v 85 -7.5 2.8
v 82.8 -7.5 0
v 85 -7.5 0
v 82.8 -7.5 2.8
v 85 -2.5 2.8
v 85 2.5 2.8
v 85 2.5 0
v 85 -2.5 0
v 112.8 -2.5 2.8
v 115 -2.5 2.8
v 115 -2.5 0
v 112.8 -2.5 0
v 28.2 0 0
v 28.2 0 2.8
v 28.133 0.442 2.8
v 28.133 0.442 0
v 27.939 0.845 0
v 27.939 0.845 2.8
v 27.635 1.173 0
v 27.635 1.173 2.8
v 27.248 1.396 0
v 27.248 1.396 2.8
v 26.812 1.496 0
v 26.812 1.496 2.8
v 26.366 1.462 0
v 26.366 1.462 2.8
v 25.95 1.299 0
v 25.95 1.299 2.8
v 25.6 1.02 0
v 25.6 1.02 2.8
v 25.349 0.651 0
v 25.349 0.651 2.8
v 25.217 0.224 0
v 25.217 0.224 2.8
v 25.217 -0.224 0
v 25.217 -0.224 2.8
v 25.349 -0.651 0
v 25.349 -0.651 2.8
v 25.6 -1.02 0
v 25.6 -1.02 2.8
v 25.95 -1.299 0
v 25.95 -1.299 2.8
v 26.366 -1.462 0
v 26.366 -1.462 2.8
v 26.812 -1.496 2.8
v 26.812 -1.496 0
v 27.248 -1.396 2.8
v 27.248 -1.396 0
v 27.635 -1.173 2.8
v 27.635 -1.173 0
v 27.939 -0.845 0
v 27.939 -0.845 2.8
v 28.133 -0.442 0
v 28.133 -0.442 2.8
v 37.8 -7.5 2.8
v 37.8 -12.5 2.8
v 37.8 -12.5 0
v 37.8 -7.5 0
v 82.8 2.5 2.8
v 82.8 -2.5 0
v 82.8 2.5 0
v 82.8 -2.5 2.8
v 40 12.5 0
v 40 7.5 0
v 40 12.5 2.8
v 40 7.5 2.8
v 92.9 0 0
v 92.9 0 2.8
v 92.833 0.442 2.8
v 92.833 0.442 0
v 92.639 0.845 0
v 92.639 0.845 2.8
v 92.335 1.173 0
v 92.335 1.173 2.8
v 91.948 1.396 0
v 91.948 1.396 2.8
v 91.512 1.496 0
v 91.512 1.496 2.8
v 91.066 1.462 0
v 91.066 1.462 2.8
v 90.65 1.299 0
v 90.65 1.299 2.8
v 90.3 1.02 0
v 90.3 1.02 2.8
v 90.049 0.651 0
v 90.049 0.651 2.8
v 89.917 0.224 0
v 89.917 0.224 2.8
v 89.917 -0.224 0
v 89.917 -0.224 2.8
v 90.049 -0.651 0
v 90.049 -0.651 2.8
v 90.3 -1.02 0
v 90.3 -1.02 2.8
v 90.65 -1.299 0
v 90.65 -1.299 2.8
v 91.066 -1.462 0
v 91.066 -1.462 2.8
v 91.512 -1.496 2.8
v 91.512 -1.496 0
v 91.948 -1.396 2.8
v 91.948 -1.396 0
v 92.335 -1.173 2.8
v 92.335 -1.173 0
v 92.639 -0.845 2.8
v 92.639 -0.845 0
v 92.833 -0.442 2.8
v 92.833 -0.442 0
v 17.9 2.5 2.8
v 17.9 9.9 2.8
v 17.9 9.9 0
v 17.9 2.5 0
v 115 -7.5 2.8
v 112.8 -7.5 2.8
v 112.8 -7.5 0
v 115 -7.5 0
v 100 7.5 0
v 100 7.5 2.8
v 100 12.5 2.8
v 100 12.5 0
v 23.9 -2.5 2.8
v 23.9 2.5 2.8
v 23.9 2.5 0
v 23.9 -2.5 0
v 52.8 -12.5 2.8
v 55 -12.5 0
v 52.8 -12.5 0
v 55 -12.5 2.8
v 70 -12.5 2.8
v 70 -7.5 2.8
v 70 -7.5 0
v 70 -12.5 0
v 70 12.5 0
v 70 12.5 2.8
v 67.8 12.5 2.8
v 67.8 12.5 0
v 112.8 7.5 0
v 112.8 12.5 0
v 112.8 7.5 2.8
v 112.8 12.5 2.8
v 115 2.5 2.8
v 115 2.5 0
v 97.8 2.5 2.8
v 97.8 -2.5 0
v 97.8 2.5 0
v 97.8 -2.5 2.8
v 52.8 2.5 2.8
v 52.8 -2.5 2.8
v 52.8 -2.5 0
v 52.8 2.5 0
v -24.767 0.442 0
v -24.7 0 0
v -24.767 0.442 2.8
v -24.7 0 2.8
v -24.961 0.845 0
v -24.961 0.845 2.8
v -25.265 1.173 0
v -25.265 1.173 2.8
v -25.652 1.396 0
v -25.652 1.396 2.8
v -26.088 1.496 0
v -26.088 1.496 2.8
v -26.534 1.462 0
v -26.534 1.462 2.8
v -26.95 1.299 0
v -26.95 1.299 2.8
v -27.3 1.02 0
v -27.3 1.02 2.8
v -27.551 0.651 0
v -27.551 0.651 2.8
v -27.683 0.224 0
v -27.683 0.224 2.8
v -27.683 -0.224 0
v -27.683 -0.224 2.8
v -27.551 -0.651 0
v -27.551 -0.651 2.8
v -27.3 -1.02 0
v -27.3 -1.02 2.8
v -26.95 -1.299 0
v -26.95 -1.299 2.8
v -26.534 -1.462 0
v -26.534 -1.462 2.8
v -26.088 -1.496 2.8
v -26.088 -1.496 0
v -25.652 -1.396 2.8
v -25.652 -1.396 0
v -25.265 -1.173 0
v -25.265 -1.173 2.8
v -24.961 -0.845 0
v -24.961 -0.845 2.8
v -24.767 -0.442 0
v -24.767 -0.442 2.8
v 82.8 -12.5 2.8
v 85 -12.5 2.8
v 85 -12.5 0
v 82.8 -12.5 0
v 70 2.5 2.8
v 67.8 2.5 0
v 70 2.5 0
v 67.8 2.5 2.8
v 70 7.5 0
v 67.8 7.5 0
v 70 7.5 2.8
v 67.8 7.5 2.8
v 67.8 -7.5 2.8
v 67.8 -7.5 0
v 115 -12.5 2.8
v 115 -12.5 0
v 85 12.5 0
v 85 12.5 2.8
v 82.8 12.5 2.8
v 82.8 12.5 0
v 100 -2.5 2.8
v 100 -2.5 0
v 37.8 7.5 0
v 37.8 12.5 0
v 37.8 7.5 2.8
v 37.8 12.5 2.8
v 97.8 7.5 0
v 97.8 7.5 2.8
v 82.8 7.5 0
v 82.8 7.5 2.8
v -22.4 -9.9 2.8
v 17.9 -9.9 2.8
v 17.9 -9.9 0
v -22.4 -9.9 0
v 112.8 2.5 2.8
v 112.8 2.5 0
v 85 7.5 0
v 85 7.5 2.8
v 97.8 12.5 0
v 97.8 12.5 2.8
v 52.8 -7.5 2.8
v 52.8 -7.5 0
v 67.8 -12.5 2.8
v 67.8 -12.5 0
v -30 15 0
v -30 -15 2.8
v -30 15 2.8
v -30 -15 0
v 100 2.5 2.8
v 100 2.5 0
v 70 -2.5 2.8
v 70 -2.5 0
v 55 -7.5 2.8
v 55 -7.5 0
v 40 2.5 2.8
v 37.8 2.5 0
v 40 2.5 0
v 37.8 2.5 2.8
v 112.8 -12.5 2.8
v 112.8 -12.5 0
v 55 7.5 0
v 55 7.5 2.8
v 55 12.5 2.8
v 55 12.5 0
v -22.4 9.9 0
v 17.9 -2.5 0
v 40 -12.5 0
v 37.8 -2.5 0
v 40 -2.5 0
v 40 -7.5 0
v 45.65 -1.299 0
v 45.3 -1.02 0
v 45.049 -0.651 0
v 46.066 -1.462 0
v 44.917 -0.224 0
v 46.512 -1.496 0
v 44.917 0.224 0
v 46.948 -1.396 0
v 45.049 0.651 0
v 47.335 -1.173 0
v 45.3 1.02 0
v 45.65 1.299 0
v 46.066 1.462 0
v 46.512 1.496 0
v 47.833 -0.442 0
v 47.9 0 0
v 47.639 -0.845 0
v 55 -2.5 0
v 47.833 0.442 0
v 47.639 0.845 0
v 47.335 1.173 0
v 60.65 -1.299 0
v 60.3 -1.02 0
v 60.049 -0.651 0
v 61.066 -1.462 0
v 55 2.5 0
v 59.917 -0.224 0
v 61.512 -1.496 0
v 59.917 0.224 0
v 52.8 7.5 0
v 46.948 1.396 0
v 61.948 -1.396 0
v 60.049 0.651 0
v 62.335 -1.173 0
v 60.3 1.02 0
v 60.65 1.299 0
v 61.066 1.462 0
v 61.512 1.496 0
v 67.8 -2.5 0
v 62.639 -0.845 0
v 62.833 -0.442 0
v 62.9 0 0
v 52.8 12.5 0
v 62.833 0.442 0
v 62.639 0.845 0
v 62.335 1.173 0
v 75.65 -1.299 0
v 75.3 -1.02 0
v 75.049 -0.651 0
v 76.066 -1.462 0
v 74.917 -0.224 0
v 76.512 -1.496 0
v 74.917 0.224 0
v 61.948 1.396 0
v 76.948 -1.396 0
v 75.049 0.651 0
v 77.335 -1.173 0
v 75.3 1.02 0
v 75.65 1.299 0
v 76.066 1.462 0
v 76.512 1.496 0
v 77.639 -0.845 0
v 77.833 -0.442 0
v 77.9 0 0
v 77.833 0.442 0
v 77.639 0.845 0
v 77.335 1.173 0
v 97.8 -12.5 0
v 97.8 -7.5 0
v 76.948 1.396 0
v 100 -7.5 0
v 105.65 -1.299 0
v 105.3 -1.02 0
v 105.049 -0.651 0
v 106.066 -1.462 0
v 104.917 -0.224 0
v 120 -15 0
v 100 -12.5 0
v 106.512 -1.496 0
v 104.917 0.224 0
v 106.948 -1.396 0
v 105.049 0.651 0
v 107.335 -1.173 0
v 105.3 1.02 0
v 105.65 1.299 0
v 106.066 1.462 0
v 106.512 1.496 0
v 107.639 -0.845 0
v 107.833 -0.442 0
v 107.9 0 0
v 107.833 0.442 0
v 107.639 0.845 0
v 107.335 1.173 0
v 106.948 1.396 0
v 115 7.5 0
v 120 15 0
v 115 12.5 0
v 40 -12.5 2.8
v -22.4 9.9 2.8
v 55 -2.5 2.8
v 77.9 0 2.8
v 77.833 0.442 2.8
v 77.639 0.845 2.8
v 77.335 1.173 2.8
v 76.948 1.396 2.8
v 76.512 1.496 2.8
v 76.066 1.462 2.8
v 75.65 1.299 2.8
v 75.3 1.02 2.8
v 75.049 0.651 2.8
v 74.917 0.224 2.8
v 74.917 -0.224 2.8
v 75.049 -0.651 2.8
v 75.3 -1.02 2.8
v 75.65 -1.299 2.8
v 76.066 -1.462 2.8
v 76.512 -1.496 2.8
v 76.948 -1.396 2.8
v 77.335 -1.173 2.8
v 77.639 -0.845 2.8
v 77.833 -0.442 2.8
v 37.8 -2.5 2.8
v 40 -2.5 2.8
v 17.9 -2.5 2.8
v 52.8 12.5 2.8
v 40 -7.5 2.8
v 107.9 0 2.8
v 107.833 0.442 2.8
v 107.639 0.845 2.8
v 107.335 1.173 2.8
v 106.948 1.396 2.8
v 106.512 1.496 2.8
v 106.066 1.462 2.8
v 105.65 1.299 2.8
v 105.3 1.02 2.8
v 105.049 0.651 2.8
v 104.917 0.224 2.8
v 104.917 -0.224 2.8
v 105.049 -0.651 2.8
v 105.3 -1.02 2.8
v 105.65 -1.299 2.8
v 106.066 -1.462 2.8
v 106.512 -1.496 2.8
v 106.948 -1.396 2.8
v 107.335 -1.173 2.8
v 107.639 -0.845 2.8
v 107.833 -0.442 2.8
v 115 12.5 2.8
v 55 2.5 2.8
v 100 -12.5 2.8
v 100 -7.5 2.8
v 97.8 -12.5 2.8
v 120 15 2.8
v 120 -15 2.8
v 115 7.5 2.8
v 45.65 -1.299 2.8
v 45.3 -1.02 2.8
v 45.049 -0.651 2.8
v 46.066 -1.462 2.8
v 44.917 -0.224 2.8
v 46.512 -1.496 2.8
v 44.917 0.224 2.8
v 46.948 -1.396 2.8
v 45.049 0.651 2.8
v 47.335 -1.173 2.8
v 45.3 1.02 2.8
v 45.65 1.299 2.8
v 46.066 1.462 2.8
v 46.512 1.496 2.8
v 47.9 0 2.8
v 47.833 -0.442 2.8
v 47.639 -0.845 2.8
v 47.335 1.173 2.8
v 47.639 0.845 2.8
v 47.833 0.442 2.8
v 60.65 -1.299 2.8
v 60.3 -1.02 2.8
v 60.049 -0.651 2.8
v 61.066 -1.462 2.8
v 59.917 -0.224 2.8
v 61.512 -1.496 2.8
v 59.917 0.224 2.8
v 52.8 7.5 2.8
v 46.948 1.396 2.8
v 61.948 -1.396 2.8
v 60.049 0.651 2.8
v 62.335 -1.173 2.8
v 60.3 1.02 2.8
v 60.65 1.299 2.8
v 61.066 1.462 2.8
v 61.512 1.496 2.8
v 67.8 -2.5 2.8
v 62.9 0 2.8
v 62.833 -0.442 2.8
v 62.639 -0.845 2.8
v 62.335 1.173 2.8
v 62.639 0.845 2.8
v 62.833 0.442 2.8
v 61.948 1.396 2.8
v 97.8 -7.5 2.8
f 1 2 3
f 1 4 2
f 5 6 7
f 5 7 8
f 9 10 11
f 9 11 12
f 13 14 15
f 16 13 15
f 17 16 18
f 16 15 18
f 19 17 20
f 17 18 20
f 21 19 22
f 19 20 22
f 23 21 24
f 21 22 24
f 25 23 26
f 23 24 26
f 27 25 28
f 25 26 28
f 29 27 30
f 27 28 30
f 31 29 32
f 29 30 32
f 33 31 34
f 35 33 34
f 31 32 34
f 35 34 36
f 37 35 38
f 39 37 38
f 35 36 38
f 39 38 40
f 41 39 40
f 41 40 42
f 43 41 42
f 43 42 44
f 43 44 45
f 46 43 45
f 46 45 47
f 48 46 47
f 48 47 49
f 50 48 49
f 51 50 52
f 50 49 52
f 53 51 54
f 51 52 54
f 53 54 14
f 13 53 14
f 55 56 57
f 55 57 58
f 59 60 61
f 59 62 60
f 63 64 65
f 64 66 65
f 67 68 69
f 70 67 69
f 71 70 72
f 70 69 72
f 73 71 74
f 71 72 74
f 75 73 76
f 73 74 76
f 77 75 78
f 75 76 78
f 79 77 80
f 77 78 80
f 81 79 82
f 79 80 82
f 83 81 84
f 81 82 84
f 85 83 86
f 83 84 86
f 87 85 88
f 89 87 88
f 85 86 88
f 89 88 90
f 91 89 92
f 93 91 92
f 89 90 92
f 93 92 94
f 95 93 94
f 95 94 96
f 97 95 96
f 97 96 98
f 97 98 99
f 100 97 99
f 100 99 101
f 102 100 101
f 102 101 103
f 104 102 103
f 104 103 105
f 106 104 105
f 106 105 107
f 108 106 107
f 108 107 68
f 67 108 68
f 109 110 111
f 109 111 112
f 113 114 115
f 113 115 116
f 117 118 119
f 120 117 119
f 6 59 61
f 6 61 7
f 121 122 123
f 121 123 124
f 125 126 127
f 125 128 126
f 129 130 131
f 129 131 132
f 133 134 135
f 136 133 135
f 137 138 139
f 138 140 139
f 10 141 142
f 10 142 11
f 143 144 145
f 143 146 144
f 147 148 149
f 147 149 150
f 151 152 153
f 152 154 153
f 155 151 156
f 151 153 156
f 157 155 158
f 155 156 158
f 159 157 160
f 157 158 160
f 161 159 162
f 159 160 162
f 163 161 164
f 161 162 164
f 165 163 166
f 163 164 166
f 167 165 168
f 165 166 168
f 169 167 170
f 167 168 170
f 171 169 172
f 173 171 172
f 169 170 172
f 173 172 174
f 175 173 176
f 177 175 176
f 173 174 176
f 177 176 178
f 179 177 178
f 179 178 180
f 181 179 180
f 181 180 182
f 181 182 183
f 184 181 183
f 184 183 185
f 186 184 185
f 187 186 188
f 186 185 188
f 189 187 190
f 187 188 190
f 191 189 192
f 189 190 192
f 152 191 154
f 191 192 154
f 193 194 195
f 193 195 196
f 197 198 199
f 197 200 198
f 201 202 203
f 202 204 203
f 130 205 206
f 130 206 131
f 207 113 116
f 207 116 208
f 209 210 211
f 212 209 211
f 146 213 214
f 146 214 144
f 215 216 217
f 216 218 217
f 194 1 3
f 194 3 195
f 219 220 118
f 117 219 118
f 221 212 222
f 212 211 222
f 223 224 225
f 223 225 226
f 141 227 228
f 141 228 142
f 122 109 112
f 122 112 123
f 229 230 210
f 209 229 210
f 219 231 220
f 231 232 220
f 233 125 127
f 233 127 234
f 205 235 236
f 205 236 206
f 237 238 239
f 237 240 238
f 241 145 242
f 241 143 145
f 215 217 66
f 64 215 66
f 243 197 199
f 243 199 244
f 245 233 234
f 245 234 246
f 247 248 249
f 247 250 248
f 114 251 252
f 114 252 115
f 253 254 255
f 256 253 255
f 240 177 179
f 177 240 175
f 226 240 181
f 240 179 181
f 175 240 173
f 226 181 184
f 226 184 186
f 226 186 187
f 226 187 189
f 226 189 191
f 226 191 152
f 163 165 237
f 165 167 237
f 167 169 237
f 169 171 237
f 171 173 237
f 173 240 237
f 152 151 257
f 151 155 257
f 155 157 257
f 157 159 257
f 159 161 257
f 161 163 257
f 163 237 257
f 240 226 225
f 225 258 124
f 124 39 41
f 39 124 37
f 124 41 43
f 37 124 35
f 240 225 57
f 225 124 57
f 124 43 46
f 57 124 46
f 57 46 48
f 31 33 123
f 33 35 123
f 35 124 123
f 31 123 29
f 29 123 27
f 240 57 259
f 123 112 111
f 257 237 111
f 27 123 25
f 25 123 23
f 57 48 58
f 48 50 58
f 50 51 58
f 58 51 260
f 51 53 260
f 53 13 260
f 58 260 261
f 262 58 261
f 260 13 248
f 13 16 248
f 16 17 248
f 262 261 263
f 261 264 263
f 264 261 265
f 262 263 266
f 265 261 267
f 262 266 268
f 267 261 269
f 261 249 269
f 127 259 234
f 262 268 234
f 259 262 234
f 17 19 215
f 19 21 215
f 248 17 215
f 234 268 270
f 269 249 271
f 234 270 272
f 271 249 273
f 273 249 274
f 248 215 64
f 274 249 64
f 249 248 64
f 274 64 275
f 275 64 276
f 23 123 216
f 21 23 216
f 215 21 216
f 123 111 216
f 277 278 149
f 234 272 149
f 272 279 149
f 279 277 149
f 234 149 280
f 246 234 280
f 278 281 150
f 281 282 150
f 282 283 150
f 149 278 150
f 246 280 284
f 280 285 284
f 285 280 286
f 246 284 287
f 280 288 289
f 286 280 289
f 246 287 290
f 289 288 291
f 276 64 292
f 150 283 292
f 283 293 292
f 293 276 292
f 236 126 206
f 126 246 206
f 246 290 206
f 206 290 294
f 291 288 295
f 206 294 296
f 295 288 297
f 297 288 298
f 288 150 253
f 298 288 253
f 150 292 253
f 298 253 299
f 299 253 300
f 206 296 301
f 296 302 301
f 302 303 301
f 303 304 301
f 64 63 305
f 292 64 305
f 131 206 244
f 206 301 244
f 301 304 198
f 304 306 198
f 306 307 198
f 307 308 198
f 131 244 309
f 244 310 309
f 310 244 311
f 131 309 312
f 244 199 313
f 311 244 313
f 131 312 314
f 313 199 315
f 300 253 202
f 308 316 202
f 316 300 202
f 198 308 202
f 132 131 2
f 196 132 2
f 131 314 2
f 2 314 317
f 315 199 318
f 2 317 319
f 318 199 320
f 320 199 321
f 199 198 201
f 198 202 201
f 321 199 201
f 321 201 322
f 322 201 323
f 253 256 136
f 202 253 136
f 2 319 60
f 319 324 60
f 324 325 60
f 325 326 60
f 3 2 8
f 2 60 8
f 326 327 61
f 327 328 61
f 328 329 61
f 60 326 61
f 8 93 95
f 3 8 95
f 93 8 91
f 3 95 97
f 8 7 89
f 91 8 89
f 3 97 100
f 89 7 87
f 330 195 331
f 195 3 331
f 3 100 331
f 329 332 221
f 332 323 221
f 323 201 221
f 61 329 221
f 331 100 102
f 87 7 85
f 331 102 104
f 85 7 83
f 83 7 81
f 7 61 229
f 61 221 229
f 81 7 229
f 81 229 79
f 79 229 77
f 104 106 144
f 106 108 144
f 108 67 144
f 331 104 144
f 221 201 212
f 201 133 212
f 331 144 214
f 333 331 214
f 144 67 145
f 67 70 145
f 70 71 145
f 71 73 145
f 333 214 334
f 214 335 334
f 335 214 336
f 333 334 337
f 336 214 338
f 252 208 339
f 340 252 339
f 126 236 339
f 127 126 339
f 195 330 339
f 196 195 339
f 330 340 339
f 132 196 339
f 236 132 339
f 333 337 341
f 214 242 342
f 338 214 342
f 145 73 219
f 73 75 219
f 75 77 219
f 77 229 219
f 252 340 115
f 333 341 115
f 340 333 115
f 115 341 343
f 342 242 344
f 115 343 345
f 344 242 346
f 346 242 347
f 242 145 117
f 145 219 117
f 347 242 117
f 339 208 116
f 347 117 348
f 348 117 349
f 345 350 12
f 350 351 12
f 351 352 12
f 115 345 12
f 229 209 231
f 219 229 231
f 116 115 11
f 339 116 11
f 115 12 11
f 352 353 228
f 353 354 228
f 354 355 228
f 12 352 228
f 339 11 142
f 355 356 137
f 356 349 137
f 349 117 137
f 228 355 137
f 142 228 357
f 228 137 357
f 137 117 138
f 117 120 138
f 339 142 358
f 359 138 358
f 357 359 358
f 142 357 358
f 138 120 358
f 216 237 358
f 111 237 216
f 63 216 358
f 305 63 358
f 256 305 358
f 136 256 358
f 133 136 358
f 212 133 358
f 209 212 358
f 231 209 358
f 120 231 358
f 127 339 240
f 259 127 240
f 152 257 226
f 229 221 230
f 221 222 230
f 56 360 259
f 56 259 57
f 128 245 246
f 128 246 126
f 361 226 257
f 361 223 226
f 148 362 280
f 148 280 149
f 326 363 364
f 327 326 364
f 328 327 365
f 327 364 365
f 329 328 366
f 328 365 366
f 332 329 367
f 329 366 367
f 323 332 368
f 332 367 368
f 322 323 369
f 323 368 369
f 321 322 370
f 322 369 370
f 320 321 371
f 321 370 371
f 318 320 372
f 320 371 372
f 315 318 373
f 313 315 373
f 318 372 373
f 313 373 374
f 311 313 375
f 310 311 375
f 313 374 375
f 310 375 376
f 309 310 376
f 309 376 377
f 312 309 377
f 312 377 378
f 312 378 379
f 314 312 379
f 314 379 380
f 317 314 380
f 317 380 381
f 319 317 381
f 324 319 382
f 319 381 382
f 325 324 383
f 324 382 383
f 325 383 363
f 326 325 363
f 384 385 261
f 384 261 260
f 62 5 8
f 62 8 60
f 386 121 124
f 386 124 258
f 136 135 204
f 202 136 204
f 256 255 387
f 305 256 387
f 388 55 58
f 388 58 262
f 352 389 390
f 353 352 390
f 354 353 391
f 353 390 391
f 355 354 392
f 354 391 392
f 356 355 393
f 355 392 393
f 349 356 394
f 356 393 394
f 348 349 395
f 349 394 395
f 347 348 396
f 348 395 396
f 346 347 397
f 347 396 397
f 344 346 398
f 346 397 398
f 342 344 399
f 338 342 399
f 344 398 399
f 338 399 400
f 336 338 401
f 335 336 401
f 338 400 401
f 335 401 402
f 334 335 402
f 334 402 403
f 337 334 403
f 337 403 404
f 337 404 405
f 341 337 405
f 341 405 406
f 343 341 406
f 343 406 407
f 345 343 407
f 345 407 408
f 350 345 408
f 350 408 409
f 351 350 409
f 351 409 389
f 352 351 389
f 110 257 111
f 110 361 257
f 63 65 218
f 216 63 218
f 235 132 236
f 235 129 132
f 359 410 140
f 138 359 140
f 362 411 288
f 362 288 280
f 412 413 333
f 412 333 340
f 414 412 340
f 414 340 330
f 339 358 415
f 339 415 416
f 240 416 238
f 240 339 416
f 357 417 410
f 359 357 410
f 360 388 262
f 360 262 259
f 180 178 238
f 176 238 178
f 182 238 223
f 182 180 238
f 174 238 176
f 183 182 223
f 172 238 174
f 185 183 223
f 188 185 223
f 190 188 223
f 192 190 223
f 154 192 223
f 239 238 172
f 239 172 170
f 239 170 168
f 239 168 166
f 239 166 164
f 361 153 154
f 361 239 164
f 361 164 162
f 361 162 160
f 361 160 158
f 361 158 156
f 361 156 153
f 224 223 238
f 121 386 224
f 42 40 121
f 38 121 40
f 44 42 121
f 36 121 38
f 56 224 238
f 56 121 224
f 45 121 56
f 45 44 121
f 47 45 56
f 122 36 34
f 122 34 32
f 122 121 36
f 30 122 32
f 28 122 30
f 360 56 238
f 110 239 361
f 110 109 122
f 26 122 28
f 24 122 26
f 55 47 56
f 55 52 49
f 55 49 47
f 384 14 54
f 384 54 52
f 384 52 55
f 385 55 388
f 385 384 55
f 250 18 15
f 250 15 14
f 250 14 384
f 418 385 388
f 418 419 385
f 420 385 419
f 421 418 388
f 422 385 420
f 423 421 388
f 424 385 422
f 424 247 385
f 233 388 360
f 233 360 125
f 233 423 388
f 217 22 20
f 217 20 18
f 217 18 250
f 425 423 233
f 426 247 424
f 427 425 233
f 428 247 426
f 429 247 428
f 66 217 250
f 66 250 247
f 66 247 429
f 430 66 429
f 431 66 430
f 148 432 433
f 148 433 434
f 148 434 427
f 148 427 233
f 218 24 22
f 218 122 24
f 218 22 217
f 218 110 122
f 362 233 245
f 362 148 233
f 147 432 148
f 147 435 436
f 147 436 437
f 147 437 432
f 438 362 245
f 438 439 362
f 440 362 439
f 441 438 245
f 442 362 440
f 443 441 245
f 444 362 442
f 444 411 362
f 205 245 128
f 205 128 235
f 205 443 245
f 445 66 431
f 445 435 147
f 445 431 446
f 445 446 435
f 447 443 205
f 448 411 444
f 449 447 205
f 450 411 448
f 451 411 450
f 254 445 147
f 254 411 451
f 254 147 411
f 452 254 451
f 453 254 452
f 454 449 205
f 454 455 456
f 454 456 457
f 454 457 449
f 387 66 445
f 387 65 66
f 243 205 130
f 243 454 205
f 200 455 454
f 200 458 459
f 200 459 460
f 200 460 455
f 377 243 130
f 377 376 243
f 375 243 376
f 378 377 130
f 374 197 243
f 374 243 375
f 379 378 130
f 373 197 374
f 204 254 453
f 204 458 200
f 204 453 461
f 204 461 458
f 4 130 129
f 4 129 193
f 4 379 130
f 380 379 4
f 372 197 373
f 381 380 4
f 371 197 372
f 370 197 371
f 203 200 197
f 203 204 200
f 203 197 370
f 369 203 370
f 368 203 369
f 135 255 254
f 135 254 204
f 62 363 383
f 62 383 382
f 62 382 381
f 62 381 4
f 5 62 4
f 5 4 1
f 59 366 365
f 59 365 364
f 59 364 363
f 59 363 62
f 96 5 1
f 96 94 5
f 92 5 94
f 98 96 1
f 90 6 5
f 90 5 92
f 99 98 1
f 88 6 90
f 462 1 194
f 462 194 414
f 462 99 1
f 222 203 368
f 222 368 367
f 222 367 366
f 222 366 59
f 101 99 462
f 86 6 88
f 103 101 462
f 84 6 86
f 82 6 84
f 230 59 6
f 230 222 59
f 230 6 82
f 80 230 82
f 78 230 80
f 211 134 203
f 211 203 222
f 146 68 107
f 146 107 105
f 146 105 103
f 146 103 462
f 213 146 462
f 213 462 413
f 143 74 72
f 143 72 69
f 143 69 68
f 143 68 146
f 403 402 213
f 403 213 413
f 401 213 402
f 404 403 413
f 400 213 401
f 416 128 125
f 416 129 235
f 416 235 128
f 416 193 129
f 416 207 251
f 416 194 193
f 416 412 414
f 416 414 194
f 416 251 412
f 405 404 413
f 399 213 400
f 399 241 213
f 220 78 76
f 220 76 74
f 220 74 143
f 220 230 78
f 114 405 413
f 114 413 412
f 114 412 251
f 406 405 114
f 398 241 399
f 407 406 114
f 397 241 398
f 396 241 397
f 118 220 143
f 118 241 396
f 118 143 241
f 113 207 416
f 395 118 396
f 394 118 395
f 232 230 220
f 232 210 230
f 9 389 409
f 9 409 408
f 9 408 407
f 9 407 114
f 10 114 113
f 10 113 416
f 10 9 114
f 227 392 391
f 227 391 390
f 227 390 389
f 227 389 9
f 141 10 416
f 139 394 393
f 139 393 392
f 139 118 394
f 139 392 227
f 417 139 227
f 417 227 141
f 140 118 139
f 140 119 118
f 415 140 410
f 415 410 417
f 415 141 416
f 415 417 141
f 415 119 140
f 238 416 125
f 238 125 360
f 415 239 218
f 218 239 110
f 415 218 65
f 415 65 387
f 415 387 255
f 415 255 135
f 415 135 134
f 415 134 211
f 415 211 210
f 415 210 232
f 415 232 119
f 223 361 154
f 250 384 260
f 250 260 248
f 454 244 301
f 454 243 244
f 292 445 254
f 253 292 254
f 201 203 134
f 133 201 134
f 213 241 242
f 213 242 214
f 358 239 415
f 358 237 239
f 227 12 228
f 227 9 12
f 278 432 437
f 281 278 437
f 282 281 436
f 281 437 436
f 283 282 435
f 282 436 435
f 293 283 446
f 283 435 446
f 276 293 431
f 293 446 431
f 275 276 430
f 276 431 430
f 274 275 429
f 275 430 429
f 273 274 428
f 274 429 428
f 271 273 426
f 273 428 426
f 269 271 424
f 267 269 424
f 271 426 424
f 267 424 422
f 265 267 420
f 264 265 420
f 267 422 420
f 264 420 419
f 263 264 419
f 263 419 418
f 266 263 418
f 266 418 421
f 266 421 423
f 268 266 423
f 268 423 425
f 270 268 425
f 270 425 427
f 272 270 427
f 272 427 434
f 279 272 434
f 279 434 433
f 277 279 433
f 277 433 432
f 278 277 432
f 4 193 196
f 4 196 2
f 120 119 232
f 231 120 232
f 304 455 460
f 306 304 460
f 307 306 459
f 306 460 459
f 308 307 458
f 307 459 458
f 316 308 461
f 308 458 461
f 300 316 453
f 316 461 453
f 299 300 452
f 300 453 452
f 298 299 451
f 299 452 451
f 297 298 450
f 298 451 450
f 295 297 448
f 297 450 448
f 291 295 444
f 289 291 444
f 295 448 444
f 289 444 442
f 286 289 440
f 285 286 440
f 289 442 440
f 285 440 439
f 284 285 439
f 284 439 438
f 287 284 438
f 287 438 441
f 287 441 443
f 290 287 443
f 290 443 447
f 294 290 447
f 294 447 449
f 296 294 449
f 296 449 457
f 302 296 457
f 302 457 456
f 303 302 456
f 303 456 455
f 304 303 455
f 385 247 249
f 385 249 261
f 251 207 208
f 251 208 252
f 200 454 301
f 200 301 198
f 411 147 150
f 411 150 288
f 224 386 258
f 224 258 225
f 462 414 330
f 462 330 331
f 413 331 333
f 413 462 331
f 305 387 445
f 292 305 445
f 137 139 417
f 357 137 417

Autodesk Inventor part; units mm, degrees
ref_plane "YZ Plane" through (0, 0, 0) normal (1, 0, 0) x (0, 1, 0)
ref_plane "XZ Plane" through (0, 0, 0) normal (0, 1, 0) x (-1, 0, 0)
ref_plane "XY Plane" through (0, 0, 0) normal (0, 0, 1) x (1, 0, 0)
sketch "Sketch1" plane through (0, 0, 0) normal (0, 0, 1) x (1, 0, 0)
  line L0 (-30, -15) -> (-30, 15)
  line L1 (-30, 15) -> (120, 15)
  line L2 (120, 15) -> (120, -15)
  line L3 (120, -15) -> (-30, -15)
  line L4 (-60, 0) -> (150, 0) projected
  line L5 (0, -21) -> (0, 21) projected
  dimension "d13" = 30
  dimension "d55" = 150
  dimension "d56" = 15
extrude "Extrusion1" add sketch "Sketch1" along normal blind 2.8
sketch "Sketch4" plane through (0, 0, 2.8) normal (0, 0, 1) x (1, 0, 0)
  line L0 (-60, 0) -> (150, 0) projected
  line L1 (17.9, 9.9) -> (17.9, 2.5)
  line L2 (-22.4, 9.9) -> (17.9, 9.9)
  line L3 (17.9, 2.5) -> (23.9, 2.5)
  line L4 (23.9, 2.5) -> (23.9, -2.5)
  line L5 (23.9, -2.5) -> (17.9, -2.5)
  line L6 (17.9, -2.5) -> (17.9, -9.9)
  line L7 (17.9, -9.9) -> (-22.4, -9.9)
  line L8 (-22.4, -9.9) -> (-22.4, 9.9)
  line L9 (-22.4, 9.9) -> (17.9, 9.9)
  circle A0 centre (26.7, 0) radius 1.5
  circle A1 centre (-26.2, 0) radius 1.5
  line L10 (120, 15) -> (120, -15) projected
  line L11 (120, -15) -> (-30, -15) projected
  line L12 (112.8, 2.5) -> (115, 2.5)
  line L13 (115, 2.5) -> (115, -2.5)
  line L14 (115, -2.5) -> (112.8, -2.5)
  line L15 (112.8, -2.5) -> (112.8, 2.5)
  line L16 (97.8, 2.5) -> (100, 2.5)
  line L17 (100, 2.5) -> (100, -2.5)
  line L18 (100, -2.5) -> (97.8, -2.5)
  line L19 (97.8, -2.5) -> (97.8, 2.5)
  line L20 (82.8, 2.5) -> (85, 2.5)
  line L21 (85, 2.5) -> (85, -2.5)
  line L22 (85, -2.5) -> (82.8, -2.5)
  line L23 (82.8, -2.5) -> (82.8, 2.5)
  line L24 (67.8, 2.5) -> (70, 2.5)
  line L25 (70, 2.5) -> (70, -2.5)
  line L26 (70, -2.5) -> (67.8, -2.5)
  line L27 (67.8, -2.5) -> (67.8, 2.5)
  line L28 (52.8, 2.5) -> (55, 2.5)
  line L29 (55, 2.5) -> (55, -2.5)
  line L30 (55, -2.5) -> (52.8, -2.5)
  line L31 (52.8, -2.5) -> (52.8, 2.5)
  line L32 (37.8, 2.5) -> (40, 2.5)
  line L33 (40, 2.5) -> (40, -2.5)
  line L34 (40, -2.5) -> (37.8, -2.5)
  line L35 (37.8, -2.5) -> (37.8, 2.5)
  line L36 (112.8, -7.5) -> (115, -7.5)
  line L37 (115, -7.5) -> (115, -12.5)
  line L38 (115, -12.5) -> (112.8, -12.5)
  line L39 (112.8, -12.5) -> (112.8, -7.5)
  line L40 (97.8, -7.5) -> (100, -7.5)
  line L41 (100, -7.5) -> (100, -12.5)
  line L42 (100, -12.5) -> (97.8, -12.5)
  line L43 (97.8, -12.5) -> (97.8, -7.5)
  line L44 (82.8, -7.5) -> (85, -7.5)
  line L45 (85, -7.5) -> (85, -12.5)
  line L46 (85, -12.5) -> (82.8, -12.5)
  line L47 (82.8, -12.5) -> (82.8, -7.5)
  line L48 (67.8, -7.5) -> (70, -7.5)
  line L49 (70, -7.5) -> (70, -12.5)
  line L50 (70, -12.5) -> (67.8, -12.5)
  line L51 (67.8, -12.5) -> (67.8, -7.5)
  line L52 (52.8, -7.5) -> (55, -7.5)
  line L53 (55, -7.5) -> (55, -12.5)
  line L54 (55, -12.5) -> (52.8, -12.5)
  line L55 (52.8, -12.5) -> (52.8, -7.5)
  line L56 (37.8, -7.5) -> (40, -7.5)
  line L57 (40, -7.5) -> (40, -12.5)
  line L58 (40, -12.5) -> (37.8, -12.5)
  line L59 (37.8, -12.5) -> (37.8, -7.5)
  line L60 (112.8, 12.5) -> (112.8, 7.5)
  line L61 (115, 12.5) -> (112.8, 12.5)
  line L62 (112.8, 7.5) -> (115, 7.5)
  line L63 (115, 7.5) -> (115, 12.5)
  line L64 (97.8, 12.5) -> (97.8, 7.5)
  line L65 (100, 12.5) -> (97.8, 12.5)
  line L66 (97.8, 7.5) -> (100, 7.5)
  line L67 (100, 7.5) -> (100, 12.5)
  line L68 (82.8, 12.5) -> (82.8, 7.5)
  line L69 (85, 12.5) -> (82.8, 12.5)
  line L70 (82.8, 7.5) -> (85, 7.5)
  line L71 (85, 7.5) -> (85, 12.5)
  line L72 (67.8, 12.5) -> (67.8, 7.5)
  line L73 (70, 12.5) -> (67.8, 12.5)
  line L74 (67.8, 7.5) -> (70, 7.5)
  line L75 (70, 7.5) -> (70, 12.5)
  line L76 (52.8, 12.5) -> (52.8, 7.5)
  line L77 (55, 12.5) -> (52.8, 12.5)
  line L78 (52.8, 7.5) -> (55, 7.5)
  line L79 (55, 7.5) -> (55, 12.5)
  line L80 (37.8, 12.5) -> (37.8, 7.5)
  line L81 (40, 12.5) -> (37.8, 12.5)
  line L82 (37.8, 7.5) -> (40, 7.5)
  line L83 (40, 7.5) -> (40, 12.5)
  circle A2 centre (106.4, 0) radius 1.5
  circle A3 centre (91.4, 0) radius 1.5
  circle A4 centre (76.4, 0) radius 1.5
  circle A5 centre (61.4, 0) radius 1.5
  circle A6 centre (46.4, 0) radius 1.5
  dimension "d57" = 2.2
  dimension "d58" = 5
  dimension "d59" = 2.5
  dimension "d60" = 5
  dimension "d63" = 15
  dimension "d66" = 10
  dimension "d69" = 3
  dimension "d70" = 6.4
  dimension "d73" = 15
extrude "Extrusion3" cut sketch "Sketch4" against normal through all
equation "\"d56\" = 0.5 * d13"
properties part number "Acrylic_UpperArm_Support"
